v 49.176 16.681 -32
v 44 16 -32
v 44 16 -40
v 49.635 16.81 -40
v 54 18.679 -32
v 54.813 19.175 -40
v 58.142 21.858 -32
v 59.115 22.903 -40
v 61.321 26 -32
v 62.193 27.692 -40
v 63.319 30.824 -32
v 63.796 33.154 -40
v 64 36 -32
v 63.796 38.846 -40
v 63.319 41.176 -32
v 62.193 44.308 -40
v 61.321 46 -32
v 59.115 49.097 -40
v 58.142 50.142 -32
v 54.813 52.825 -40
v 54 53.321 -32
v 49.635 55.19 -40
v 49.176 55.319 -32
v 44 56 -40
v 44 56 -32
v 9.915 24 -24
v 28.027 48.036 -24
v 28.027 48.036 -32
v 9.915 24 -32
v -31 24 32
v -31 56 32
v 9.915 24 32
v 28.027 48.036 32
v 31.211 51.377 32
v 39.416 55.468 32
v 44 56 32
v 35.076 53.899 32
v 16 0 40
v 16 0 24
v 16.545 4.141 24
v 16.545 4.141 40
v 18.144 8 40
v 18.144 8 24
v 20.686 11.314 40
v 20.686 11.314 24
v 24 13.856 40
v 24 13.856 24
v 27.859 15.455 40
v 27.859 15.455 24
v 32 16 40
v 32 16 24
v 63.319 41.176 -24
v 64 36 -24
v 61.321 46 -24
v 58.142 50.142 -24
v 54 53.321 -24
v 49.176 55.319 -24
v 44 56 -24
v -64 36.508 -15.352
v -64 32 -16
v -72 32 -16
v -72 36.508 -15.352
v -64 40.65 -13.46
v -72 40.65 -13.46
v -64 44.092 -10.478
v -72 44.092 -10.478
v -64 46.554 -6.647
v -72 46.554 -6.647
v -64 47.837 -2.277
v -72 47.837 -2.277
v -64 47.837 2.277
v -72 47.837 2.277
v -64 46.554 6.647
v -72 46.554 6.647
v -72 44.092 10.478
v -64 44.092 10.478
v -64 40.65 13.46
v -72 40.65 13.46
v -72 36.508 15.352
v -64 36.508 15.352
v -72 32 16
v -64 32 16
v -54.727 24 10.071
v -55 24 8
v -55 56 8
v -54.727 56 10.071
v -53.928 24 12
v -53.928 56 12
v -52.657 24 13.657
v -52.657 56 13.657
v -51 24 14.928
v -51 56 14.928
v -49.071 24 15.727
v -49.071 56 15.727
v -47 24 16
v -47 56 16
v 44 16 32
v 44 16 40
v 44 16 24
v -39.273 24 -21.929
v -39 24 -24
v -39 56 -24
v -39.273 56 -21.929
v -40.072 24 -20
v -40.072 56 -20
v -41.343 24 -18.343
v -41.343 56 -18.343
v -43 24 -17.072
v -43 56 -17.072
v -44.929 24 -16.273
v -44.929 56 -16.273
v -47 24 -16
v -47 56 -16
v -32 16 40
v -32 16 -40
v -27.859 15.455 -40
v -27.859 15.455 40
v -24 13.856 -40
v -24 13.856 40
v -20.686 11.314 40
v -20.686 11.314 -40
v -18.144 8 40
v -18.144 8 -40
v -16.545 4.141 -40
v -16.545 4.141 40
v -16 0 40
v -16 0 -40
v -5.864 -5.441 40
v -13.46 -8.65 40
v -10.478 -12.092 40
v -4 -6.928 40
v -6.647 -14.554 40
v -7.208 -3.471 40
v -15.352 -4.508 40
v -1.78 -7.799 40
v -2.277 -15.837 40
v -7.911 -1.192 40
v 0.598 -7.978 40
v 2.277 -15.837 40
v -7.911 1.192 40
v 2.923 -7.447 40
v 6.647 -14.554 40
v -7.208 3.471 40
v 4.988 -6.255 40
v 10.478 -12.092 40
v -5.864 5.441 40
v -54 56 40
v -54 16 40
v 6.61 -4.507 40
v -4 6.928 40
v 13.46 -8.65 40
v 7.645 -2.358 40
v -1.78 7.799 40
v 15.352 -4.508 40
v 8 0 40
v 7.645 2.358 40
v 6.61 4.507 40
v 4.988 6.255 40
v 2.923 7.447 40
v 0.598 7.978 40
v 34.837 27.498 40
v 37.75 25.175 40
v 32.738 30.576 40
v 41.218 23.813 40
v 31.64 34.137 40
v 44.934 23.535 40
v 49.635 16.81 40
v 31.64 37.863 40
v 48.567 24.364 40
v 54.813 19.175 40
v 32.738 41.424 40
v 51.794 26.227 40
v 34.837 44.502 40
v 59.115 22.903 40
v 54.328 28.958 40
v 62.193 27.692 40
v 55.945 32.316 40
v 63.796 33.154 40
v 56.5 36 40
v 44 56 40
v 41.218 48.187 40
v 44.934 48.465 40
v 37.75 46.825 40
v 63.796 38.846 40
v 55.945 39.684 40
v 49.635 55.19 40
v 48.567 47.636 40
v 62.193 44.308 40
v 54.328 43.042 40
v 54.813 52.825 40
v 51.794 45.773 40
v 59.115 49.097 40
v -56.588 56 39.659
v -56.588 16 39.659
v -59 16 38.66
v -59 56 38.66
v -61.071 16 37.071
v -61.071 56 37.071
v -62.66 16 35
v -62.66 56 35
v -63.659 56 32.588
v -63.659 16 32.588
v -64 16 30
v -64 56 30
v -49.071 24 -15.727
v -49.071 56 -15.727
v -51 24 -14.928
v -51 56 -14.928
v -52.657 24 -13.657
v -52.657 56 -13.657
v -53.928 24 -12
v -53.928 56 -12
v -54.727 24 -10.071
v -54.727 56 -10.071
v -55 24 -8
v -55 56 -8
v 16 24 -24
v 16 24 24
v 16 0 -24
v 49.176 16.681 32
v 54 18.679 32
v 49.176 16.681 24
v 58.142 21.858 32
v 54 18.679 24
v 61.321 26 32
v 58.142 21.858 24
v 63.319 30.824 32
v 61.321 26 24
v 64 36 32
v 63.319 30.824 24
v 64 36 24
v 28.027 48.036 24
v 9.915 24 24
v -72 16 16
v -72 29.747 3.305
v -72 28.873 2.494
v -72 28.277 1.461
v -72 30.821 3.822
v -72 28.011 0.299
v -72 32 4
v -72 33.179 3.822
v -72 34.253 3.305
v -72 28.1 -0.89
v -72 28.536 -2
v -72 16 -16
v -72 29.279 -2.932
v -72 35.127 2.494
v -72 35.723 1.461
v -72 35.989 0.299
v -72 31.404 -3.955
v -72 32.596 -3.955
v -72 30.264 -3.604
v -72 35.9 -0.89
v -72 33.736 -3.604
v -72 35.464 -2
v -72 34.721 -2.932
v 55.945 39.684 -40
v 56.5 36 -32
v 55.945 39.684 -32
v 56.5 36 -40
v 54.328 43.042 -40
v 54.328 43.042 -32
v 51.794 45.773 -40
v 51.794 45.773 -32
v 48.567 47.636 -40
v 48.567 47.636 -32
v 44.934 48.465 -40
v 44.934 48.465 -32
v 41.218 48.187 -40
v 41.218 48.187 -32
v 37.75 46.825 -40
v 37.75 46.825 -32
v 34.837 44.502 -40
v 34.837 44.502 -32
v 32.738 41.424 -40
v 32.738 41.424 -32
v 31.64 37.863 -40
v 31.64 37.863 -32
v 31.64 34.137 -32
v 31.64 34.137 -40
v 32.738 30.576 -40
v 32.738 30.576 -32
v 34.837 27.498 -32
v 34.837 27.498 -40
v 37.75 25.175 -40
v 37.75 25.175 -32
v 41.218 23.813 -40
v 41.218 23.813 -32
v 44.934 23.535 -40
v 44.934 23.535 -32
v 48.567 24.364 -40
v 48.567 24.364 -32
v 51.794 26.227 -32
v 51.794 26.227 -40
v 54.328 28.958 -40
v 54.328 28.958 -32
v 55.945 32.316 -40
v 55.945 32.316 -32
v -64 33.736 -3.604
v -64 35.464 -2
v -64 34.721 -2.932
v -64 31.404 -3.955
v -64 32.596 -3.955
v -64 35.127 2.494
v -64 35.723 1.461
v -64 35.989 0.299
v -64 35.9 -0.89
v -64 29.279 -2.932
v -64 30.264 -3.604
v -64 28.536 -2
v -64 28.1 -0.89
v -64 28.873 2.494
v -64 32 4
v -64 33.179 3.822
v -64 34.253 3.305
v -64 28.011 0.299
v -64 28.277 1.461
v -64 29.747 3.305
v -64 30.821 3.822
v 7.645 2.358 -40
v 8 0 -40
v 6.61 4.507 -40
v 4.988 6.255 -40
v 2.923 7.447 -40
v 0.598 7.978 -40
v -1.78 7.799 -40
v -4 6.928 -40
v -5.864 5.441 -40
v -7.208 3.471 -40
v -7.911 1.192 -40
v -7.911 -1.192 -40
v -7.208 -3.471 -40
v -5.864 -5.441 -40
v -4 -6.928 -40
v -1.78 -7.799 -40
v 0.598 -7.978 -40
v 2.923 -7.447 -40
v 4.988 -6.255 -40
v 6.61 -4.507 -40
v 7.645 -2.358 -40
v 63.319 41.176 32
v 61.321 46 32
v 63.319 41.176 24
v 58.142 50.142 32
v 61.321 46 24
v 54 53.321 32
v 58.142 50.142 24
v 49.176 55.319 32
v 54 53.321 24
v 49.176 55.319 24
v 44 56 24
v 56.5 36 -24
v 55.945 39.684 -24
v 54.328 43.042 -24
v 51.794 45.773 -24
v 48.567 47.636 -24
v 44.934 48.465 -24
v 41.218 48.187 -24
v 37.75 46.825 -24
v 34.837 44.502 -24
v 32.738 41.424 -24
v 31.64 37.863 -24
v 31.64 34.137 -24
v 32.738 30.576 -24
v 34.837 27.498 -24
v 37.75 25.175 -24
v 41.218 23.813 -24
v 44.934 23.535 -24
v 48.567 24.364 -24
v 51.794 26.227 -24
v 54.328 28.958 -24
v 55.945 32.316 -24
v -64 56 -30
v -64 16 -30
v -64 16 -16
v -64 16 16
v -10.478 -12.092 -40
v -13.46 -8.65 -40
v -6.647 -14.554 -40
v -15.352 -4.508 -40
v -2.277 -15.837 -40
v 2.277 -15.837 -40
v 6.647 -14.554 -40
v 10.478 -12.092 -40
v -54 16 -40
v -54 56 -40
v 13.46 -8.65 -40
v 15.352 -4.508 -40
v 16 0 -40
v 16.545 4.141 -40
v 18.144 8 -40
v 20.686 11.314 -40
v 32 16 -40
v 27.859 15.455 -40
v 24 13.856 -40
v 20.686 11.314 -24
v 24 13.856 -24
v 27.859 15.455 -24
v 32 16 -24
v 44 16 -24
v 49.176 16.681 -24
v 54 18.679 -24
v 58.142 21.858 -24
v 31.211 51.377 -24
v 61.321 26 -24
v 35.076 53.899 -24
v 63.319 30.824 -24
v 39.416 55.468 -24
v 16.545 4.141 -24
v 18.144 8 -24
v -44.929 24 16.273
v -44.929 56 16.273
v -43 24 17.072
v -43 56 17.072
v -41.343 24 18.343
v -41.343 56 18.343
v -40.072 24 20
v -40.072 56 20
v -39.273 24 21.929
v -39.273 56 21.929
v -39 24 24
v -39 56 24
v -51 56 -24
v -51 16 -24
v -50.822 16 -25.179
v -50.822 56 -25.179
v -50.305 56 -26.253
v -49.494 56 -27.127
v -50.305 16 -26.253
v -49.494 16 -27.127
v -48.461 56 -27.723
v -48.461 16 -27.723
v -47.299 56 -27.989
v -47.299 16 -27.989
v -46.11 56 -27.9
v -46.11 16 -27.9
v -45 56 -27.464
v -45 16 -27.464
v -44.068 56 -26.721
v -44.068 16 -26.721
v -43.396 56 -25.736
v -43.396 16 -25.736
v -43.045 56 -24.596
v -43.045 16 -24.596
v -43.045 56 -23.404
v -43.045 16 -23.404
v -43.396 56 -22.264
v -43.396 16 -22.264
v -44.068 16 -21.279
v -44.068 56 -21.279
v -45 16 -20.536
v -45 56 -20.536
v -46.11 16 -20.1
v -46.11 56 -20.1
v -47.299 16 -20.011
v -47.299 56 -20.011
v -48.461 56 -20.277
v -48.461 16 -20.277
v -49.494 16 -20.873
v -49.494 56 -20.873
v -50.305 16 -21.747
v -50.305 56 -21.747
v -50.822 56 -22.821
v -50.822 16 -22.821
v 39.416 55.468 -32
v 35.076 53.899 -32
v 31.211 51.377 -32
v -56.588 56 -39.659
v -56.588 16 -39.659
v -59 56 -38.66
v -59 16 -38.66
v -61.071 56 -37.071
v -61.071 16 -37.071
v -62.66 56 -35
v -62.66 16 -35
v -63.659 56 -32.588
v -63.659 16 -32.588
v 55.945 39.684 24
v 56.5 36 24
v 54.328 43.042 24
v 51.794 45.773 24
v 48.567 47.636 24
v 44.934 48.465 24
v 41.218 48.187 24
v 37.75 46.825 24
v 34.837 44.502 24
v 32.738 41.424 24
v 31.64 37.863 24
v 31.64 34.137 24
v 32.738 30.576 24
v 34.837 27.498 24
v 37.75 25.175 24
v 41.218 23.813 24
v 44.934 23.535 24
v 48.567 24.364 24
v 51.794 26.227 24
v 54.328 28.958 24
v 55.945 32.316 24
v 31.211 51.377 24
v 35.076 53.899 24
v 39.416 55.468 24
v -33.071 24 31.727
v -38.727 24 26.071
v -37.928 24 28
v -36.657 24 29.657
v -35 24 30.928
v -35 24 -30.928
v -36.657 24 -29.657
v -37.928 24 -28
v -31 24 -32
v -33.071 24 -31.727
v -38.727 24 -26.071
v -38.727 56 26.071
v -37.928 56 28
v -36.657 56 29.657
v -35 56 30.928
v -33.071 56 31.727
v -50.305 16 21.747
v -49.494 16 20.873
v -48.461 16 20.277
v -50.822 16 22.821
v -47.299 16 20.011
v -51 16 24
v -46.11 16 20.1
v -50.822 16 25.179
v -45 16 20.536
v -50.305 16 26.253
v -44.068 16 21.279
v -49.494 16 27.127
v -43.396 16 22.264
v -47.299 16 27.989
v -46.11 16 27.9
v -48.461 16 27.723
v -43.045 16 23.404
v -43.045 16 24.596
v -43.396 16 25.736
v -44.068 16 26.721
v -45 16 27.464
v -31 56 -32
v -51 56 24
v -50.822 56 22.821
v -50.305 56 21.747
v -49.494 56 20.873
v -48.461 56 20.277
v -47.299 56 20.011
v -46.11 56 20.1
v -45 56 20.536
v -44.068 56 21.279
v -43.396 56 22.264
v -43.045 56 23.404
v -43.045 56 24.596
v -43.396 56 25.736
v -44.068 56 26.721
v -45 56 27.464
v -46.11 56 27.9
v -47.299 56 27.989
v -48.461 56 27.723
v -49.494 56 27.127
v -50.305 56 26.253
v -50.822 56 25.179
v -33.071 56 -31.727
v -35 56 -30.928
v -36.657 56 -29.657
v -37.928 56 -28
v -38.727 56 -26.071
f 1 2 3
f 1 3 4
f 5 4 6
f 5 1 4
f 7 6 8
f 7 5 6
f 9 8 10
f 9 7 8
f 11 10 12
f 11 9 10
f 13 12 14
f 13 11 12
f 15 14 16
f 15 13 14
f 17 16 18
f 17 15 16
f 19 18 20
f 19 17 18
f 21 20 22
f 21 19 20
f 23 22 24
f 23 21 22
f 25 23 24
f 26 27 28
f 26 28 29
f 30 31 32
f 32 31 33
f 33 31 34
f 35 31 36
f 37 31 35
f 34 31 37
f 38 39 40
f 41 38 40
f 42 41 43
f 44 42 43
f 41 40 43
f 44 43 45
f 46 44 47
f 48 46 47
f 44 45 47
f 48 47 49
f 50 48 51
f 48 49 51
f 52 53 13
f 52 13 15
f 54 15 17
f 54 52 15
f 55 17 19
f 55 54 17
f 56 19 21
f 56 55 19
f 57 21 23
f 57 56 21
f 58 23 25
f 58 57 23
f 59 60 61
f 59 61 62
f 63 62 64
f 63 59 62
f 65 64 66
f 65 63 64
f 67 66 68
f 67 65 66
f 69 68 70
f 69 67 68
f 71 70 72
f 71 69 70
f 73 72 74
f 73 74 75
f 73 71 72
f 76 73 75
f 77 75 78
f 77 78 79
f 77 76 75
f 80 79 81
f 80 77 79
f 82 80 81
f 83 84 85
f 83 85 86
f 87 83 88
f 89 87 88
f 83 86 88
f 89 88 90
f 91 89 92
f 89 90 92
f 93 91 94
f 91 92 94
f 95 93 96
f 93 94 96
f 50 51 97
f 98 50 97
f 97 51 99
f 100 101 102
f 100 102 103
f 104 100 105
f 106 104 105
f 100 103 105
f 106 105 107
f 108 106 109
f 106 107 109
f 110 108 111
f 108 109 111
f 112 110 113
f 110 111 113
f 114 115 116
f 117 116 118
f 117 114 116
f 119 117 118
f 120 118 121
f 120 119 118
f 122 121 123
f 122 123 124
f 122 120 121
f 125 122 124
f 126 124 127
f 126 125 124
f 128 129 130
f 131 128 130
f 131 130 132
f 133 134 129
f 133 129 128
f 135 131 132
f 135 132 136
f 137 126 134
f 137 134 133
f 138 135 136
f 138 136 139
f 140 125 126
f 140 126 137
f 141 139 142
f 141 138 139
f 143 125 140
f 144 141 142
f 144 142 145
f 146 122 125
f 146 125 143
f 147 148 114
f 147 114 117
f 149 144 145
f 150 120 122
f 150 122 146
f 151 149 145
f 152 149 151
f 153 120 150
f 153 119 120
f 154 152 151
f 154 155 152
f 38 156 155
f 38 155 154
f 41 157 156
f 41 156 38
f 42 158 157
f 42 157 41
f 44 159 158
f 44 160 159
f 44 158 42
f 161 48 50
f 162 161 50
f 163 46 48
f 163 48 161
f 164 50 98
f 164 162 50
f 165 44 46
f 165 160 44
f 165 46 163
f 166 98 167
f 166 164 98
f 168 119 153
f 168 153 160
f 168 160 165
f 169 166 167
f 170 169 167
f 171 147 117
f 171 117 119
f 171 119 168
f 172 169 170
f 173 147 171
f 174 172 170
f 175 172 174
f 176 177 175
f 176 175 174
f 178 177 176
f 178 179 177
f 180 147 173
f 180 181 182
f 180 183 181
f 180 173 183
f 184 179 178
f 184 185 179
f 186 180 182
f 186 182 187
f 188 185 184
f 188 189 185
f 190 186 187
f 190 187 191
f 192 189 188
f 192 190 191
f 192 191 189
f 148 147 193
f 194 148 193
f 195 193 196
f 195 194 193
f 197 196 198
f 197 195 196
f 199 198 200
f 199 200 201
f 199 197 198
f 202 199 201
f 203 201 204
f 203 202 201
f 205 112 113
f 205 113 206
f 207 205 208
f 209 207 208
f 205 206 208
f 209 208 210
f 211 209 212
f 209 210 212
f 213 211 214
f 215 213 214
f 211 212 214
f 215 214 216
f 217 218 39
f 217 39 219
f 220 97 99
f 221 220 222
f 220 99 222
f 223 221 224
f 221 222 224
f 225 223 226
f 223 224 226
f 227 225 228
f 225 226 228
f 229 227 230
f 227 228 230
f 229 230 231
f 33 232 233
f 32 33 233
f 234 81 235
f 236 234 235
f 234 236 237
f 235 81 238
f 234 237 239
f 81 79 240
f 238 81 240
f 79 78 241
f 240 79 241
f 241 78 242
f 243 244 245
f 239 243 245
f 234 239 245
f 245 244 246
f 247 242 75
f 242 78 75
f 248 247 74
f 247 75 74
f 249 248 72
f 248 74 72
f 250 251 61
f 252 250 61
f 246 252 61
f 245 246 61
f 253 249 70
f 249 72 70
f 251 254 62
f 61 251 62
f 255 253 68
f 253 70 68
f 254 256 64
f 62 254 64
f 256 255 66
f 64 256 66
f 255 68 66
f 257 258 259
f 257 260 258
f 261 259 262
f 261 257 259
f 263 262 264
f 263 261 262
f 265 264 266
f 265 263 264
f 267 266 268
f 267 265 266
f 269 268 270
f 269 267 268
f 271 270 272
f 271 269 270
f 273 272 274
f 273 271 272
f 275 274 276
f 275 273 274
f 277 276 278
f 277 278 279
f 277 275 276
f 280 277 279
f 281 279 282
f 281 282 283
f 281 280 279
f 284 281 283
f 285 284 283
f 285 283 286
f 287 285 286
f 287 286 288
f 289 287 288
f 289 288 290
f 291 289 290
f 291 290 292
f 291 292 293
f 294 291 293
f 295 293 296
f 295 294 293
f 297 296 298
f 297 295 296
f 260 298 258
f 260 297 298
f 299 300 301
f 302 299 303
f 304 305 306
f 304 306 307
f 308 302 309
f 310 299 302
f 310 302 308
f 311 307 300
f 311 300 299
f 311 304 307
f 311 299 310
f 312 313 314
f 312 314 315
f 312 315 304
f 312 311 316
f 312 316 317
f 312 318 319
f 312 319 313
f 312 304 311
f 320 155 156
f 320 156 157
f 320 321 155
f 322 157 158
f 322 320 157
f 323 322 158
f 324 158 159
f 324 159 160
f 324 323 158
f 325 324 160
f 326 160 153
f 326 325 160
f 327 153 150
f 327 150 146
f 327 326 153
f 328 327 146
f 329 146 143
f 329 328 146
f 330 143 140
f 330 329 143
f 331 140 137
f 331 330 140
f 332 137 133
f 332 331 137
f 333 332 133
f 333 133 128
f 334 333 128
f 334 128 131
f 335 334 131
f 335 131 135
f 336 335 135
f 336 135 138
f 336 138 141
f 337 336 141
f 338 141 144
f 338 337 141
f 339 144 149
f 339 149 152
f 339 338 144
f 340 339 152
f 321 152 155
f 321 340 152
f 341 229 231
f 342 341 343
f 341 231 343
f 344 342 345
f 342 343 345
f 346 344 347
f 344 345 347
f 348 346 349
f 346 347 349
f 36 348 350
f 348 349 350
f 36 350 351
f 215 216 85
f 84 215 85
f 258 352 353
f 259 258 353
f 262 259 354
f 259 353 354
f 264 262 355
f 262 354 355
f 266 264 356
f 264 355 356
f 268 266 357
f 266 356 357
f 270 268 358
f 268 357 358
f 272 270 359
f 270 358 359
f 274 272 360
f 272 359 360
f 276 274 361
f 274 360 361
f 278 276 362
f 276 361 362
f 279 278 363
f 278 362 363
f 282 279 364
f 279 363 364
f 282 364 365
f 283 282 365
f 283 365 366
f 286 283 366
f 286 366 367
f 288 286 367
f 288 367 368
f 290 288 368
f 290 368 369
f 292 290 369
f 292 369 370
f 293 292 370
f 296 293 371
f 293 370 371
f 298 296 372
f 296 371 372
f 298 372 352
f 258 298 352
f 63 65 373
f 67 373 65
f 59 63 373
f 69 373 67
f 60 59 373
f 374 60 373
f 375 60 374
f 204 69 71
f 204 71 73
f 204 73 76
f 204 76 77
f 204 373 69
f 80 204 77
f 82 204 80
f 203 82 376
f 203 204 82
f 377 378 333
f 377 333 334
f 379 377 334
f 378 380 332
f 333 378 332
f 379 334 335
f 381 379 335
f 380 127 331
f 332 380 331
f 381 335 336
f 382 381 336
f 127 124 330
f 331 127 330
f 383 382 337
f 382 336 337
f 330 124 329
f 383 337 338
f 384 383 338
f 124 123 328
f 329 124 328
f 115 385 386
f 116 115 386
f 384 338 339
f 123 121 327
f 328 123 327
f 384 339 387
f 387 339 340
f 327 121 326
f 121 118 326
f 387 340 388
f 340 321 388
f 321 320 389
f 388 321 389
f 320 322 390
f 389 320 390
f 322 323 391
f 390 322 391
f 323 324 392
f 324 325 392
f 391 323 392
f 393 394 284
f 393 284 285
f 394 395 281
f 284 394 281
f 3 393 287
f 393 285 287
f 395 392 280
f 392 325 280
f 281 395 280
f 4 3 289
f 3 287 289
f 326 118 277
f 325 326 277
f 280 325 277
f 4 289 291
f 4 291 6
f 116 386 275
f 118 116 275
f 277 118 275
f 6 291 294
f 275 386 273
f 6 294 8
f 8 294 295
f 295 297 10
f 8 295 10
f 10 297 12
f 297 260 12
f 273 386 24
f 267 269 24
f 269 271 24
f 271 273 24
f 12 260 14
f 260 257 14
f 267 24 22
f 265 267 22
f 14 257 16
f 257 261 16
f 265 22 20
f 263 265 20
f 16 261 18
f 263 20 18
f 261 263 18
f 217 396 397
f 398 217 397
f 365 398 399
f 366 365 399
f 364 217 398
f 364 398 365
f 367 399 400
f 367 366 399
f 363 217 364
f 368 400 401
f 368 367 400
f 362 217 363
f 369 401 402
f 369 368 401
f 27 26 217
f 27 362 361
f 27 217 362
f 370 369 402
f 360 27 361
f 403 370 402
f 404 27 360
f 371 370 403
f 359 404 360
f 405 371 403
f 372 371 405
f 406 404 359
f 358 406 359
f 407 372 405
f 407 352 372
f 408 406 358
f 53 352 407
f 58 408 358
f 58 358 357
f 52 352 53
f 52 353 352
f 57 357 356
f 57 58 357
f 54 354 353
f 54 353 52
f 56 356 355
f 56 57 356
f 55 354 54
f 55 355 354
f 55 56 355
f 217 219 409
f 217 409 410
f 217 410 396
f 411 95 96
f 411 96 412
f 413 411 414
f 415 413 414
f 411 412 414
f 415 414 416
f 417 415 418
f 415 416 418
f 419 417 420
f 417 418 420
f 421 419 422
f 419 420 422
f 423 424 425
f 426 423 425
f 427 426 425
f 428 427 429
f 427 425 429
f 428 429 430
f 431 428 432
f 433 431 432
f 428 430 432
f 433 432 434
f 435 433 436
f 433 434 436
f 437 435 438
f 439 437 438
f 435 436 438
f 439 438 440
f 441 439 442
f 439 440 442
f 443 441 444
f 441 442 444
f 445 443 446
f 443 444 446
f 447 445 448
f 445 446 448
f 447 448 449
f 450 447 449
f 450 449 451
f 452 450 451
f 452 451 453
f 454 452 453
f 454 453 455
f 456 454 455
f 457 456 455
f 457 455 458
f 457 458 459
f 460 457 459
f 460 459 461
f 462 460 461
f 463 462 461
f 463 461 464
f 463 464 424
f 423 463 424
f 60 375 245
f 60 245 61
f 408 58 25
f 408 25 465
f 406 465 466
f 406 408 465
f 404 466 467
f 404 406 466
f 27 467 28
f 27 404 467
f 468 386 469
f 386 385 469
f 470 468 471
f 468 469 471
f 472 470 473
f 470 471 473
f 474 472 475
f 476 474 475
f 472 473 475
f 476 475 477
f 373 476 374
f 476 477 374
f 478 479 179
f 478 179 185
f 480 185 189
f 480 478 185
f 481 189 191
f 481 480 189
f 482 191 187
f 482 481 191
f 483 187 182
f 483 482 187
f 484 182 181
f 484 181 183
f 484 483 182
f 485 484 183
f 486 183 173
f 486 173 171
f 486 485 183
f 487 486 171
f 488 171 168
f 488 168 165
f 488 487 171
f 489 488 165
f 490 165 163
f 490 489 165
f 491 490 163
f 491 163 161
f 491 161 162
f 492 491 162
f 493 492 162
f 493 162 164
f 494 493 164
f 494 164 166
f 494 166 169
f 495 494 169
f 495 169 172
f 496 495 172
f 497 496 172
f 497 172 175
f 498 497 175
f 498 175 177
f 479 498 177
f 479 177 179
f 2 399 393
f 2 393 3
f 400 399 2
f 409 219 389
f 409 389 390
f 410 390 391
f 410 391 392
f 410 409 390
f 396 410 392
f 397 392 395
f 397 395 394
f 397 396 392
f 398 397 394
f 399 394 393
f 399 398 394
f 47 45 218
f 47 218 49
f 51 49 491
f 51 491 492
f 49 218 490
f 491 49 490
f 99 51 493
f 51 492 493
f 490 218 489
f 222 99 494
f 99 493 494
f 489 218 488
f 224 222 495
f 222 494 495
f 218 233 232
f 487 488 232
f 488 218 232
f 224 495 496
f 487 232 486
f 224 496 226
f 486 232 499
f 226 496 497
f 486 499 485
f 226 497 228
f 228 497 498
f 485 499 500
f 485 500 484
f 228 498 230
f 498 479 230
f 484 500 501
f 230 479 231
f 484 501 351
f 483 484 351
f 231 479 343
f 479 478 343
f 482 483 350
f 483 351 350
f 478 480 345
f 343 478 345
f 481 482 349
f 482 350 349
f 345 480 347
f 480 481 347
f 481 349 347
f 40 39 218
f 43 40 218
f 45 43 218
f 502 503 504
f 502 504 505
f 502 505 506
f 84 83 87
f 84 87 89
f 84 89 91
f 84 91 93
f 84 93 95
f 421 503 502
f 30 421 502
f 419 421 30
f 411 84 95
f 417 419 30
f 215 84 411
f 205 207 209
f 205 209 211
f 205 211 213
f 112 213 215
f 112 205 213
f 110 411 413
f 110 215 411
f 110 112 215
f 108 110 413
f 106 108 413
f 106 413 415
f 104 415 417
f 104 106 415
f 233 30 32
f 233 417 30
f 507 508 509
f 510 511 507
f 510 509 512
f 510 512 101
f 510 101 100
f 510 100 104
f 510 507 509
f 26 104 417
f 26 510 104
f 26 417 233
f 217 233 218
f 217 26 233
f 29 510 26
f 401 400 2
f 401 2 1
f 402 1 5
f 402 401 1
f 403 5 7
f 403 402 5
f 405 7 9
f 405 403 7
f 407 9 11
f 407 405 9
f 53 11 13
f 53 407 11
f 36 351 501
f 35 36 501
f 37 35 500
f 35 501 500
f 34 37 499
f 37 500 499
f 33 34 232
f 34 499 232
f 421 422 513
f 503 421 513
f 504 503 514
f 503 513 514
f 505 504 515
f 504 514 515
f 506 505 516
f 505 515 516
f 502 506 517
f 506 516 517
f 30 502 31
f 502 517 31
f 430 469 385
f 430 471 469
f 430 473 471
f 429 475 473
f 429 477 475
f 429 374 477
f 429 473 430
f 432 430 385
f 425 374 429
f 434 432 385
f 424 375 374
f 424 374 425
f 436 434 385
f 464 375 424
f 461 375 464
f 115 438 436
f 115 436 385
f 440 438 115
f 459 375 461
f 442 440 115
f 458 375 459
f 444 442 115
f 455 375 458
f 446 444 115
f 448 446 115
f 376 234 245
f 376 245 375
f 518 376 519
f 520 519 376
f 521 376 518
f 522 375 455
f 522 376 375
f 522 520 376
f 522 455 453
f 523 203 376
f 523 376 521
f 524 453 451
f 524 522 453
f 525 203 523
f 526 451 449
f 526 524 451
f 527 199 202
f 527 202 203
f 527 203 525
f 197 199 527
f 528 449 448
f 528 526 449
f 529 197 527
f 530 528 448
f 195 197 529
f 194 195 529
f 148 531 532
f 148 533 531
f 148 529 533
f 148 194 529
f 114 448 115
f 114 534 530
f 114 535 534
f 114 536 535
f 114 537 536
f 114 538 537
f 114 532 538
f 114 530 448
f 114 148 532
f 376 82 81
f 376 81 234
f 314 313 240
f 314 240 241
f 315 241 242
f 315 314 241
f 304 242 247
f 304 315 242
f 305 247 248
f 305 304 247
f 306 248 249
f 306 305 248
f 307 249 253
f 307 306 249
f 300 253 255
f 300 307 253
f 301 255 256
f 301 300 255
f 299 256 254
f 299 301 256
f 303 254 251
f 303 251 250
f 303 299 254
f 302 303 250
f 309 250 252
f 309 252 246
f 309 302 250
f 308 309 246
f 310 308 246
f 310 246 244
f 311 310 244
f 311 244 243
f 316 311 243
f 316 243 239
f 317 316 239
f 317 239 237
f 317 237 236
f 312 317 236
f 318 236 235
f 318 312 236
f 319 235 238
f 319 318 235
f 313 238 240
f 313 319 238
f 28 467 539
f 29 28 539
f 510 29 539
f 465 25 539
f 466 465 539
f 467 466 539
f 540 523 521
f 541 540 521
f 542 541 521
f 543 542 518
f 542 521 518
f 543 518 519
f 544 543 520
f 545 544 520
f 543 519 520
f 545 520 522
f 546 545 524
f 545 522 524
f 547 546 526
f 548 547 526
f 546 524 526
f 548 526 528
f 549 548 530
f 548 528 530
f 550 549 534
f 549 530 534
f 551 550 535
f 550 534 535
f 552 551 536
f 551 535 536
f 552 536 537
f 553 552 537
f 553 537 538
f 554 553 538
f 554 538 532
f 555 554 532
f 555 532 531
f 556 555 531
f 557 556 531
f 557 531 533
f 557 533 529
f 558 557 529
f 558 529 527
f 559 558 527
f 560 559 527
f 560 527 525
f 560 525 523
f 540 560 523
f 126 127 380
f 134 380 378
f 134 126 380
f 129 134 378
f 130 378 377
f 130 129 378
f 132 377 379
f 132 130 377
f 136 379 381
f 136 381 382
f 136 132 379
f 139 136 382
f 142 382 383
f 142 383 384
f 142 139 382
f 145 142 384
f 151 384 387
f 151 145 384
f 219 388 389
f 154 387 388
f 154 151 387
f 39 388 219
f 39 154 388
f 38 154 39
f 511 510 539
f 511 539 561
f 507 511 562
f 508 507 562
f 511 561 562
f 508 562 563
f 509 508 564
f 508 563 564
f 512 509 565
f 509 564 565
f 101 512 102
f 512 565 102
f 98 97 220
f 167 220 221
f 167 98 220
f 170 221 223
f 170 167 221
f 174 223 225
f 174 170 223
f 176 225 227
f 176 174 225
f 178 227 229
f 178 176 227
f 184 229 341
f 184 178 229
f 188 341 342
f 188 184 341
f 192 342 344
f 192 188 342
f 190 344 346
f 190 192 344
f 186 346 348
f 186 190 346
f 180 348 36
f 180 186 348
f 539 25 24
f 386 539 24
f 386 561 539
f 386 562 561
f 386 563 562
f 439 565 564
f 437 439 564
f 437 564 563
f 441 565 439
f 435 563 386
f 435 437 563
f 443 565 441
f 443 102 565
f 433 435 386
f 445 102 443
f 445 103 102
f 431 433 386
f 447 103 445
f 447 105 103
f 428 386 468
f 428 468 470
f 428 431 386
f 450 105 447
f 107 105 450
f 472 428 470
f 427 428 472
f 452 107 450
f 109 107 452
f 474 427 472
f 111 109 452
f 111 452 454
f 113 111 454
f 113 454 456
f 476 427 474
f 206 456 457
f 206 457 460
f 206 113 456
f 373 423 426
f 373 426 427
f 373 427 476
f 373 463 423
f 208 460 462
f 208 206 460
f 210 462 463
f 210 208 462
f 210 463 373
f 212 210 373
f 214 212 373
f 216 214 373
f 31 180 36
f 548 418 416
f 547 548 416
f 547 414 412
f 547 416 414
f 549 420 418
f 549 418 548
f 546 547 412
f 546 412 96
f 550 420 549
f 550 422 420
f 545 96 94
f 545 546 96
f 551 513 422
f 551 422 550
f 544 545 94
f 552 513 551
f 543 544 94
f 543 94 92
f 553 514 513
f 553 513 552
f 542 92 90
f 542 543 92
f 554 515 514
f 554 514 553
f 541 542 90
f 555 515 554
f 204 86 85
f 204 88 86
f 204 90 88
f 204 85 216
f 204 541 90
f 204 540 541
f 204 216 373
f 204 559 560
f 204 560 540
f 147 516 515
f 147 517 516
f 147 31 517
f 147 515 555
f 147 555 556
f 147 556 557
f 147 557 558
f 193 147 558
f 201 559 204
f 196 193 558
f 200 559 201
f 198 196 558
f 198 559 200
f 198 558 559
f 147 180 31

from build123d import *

# Parameters (mm, degrees)
SKETCH1_R             = 8
SKETCH1_R_2           = 12.5
BOSS_EXTRUDE1_DEPTH   = 40
CUT_EXTRUDE1_DEPTH    = 32
SKETCH3_W             = 44
SKETCH3_H             = 64
CUT_EXTRUDE2_DEPTH    = 32
BOSS_EXTRUDE2_START   = 8
SKETCH4_R             = 12.5
BOSS_EXTRUDE2_DEPTH   = 8
F_8_0MM_DOWEL_HOLE1_D = 8
FILLET1_R             = 10
SKETCH6_R             = 4
BOSS_EXTRUDE3_DEPTH   = 8


with BuildPart() as part:
    # Sketch1 → Boss-Extrude1 (new, symmetric)
    with BuildSketch(Plane.XY):
        with BuildLine():
            Line((-64, 56), (-64, 16))
            Line((-64, 16), (-32, 16))
            ThreePointArc((-32, 16), (-20.686291501, 11.313708499), (-16, 0))
            ThreePointArc((-16, 0), (0, -16), (16, 0))
            ThreePointArc((16, 0), (20.686291501, 11.313708499), (32, 16))
            Line((32, 16), (44, 16))
            ThreePointArc((44, 16), (64, 36), (44, 56))
            Line((44, 56), (-64, 56))
        make_face()
        Circle(SKETCH1_R, mode=Mode.SUBTRACT)
        with Locations((44, 36)):
            Circle(SKETCH1_R_2, mode=Mode.SUBTRACT)
    extrude(amount=BOSS_EXTRUDE1_DEPTH, both=True)

    # Sketch2 → Cut-Extrude1 (cut)
    with BuildSketch(Plane(origin=(0, 56, 0), x_dir=(1, 0, 0), z_dir=(0, 1, 0))):
        with BuildLine():
            Line((64, 32), (-31, 32))
            ThreePointArc((-31, 32), (-36.656854249, 29.656854249), (-39, 24))
            ThreePointArc((-39, 24), (-41.343145751, 18.343145751), (-47, 16))
            ThreePointArc((-47, 16), (-52.656854249, 13.656854249), (-55, 8))
            Line((-55, 8), (-55, -8))
            ThreePointArc((-55, -8), (-52.656854249, -13.656854249), (-47, -16))
            ThreePointArc((-47, -16), (-41.343145751, -18.343145751), (-39, -24))
            ThreePointArc((-39, -24), (-36.656854249, -29.656854249), (-31, -32))
            Line((-31, -32), (64, -32))
            Line((64, -32), (64, 32))
        make_face()
    extrude(amount=-CUT_EXTRUDE1_DEPTH, mode=Mode.SUBTRACT)

    # Sketch3 → Cut-Extrude2 (cut)
    with BuildSketch(Plane(origin=(0, 24, 0), x_dir=(1, 0, 0), z_dir=(0, 1, 0))):
        with Locations((38, 0)):
            Rectangle(SKETCH3_W, SKETCH3_H)
    extrude(amount=-CUT_EXTRUDE2_DEPTH, mode=Mode.SUBTRACT)

    # Sketch4 → Boss-Extrude2 (add)
    # profile 1 of 2: a face of its own
    with BuildSketch(Plane.XY.offset(-32).offset(BOSS_EXTRUDE2_START)):
        with BuildLine():
            ThreePointArc((44, 56), (35.076043738, 53.898687232), (28.027289799, 48.036300463))
            ThreePointArc((28.027289799, 48.036300463), (26.101312768, 27.076043738), (44, 16))
            ThreePointArc((44, 16), (58.142135624, 21.857864376), (64, 36))
            ThreePointArc((64, 36), (58.142135624, 50.142135624), (44, 56))
        make_face()
        with Locations((44, 36)):
            Circle(SKETCH4_R, mode=Mode.SUBTRACT)
    # profile 2 of 2: a face of its own
    with BuildSketch(Plane.XY.offset(-32).offset(BOSS_EXTRUDE2_START)):
        with BuildLine():
            ThreePointArc((44, 16), (26.101312768, 27.076043738), (28.027289799, 48.036300463))
            Line((28.027289799, 48.036300463), (9.914638236, 24))
            Line((9.914638236, 24), (16, 24))
            Line((16, 24), (16, 0))
            ThreePointArc((16, 0), (20.686291501, 11.313708499), (32, 16))
            Line((32, 16), (44, 16))
        make_face()
    boss_extrude2 = extrude(amount=-BOSS_EXTRUDE2_DEPTH)

    # Mirror1: Boss-Extrude2 across plane
    add(boss_extrude2.mirror(Plane.XY))

    # Ø8.0mm Dowel Hole1 (through all)
    with Locations(Plane(origin=(-47, 56, -24), x_dir=(1, 0, 0), z_dir=(0, 1, 0))):
        with Locations((0, 0), (0, -48)):
            Hole(F_8_0MM_DOWEL_HOLE1_D / 2)

    # Fillet1
    fillet1_edges = [part.edges().sort_by_distance(p)[0] for p in [
        (-64, 36, -40),
        (-64, 36, 40),
    ]]
    fillet(fillet1_edges, radius=FILLET1_R)

    # Sketch6 → Boss-Extrude3 (add)
    with BuildSketch(Plane.ZY.offset(64)):
        with BuildLine():
            Line((-16, 16), (-16, 32))
            ThreePointArc((-16, 32), (0, 48), (16, 32))
            Line((16, 32), (16, 16))
            Line((16, 16), (-16, 16))
        make_face()
        with Locations((0, 32)):
            Circle(SKETCH6_R, mode=Mode.SUBTRACT)
    extrude(amount=BOSS_EXTRUDE3_DEPTH)


solid = part.part
